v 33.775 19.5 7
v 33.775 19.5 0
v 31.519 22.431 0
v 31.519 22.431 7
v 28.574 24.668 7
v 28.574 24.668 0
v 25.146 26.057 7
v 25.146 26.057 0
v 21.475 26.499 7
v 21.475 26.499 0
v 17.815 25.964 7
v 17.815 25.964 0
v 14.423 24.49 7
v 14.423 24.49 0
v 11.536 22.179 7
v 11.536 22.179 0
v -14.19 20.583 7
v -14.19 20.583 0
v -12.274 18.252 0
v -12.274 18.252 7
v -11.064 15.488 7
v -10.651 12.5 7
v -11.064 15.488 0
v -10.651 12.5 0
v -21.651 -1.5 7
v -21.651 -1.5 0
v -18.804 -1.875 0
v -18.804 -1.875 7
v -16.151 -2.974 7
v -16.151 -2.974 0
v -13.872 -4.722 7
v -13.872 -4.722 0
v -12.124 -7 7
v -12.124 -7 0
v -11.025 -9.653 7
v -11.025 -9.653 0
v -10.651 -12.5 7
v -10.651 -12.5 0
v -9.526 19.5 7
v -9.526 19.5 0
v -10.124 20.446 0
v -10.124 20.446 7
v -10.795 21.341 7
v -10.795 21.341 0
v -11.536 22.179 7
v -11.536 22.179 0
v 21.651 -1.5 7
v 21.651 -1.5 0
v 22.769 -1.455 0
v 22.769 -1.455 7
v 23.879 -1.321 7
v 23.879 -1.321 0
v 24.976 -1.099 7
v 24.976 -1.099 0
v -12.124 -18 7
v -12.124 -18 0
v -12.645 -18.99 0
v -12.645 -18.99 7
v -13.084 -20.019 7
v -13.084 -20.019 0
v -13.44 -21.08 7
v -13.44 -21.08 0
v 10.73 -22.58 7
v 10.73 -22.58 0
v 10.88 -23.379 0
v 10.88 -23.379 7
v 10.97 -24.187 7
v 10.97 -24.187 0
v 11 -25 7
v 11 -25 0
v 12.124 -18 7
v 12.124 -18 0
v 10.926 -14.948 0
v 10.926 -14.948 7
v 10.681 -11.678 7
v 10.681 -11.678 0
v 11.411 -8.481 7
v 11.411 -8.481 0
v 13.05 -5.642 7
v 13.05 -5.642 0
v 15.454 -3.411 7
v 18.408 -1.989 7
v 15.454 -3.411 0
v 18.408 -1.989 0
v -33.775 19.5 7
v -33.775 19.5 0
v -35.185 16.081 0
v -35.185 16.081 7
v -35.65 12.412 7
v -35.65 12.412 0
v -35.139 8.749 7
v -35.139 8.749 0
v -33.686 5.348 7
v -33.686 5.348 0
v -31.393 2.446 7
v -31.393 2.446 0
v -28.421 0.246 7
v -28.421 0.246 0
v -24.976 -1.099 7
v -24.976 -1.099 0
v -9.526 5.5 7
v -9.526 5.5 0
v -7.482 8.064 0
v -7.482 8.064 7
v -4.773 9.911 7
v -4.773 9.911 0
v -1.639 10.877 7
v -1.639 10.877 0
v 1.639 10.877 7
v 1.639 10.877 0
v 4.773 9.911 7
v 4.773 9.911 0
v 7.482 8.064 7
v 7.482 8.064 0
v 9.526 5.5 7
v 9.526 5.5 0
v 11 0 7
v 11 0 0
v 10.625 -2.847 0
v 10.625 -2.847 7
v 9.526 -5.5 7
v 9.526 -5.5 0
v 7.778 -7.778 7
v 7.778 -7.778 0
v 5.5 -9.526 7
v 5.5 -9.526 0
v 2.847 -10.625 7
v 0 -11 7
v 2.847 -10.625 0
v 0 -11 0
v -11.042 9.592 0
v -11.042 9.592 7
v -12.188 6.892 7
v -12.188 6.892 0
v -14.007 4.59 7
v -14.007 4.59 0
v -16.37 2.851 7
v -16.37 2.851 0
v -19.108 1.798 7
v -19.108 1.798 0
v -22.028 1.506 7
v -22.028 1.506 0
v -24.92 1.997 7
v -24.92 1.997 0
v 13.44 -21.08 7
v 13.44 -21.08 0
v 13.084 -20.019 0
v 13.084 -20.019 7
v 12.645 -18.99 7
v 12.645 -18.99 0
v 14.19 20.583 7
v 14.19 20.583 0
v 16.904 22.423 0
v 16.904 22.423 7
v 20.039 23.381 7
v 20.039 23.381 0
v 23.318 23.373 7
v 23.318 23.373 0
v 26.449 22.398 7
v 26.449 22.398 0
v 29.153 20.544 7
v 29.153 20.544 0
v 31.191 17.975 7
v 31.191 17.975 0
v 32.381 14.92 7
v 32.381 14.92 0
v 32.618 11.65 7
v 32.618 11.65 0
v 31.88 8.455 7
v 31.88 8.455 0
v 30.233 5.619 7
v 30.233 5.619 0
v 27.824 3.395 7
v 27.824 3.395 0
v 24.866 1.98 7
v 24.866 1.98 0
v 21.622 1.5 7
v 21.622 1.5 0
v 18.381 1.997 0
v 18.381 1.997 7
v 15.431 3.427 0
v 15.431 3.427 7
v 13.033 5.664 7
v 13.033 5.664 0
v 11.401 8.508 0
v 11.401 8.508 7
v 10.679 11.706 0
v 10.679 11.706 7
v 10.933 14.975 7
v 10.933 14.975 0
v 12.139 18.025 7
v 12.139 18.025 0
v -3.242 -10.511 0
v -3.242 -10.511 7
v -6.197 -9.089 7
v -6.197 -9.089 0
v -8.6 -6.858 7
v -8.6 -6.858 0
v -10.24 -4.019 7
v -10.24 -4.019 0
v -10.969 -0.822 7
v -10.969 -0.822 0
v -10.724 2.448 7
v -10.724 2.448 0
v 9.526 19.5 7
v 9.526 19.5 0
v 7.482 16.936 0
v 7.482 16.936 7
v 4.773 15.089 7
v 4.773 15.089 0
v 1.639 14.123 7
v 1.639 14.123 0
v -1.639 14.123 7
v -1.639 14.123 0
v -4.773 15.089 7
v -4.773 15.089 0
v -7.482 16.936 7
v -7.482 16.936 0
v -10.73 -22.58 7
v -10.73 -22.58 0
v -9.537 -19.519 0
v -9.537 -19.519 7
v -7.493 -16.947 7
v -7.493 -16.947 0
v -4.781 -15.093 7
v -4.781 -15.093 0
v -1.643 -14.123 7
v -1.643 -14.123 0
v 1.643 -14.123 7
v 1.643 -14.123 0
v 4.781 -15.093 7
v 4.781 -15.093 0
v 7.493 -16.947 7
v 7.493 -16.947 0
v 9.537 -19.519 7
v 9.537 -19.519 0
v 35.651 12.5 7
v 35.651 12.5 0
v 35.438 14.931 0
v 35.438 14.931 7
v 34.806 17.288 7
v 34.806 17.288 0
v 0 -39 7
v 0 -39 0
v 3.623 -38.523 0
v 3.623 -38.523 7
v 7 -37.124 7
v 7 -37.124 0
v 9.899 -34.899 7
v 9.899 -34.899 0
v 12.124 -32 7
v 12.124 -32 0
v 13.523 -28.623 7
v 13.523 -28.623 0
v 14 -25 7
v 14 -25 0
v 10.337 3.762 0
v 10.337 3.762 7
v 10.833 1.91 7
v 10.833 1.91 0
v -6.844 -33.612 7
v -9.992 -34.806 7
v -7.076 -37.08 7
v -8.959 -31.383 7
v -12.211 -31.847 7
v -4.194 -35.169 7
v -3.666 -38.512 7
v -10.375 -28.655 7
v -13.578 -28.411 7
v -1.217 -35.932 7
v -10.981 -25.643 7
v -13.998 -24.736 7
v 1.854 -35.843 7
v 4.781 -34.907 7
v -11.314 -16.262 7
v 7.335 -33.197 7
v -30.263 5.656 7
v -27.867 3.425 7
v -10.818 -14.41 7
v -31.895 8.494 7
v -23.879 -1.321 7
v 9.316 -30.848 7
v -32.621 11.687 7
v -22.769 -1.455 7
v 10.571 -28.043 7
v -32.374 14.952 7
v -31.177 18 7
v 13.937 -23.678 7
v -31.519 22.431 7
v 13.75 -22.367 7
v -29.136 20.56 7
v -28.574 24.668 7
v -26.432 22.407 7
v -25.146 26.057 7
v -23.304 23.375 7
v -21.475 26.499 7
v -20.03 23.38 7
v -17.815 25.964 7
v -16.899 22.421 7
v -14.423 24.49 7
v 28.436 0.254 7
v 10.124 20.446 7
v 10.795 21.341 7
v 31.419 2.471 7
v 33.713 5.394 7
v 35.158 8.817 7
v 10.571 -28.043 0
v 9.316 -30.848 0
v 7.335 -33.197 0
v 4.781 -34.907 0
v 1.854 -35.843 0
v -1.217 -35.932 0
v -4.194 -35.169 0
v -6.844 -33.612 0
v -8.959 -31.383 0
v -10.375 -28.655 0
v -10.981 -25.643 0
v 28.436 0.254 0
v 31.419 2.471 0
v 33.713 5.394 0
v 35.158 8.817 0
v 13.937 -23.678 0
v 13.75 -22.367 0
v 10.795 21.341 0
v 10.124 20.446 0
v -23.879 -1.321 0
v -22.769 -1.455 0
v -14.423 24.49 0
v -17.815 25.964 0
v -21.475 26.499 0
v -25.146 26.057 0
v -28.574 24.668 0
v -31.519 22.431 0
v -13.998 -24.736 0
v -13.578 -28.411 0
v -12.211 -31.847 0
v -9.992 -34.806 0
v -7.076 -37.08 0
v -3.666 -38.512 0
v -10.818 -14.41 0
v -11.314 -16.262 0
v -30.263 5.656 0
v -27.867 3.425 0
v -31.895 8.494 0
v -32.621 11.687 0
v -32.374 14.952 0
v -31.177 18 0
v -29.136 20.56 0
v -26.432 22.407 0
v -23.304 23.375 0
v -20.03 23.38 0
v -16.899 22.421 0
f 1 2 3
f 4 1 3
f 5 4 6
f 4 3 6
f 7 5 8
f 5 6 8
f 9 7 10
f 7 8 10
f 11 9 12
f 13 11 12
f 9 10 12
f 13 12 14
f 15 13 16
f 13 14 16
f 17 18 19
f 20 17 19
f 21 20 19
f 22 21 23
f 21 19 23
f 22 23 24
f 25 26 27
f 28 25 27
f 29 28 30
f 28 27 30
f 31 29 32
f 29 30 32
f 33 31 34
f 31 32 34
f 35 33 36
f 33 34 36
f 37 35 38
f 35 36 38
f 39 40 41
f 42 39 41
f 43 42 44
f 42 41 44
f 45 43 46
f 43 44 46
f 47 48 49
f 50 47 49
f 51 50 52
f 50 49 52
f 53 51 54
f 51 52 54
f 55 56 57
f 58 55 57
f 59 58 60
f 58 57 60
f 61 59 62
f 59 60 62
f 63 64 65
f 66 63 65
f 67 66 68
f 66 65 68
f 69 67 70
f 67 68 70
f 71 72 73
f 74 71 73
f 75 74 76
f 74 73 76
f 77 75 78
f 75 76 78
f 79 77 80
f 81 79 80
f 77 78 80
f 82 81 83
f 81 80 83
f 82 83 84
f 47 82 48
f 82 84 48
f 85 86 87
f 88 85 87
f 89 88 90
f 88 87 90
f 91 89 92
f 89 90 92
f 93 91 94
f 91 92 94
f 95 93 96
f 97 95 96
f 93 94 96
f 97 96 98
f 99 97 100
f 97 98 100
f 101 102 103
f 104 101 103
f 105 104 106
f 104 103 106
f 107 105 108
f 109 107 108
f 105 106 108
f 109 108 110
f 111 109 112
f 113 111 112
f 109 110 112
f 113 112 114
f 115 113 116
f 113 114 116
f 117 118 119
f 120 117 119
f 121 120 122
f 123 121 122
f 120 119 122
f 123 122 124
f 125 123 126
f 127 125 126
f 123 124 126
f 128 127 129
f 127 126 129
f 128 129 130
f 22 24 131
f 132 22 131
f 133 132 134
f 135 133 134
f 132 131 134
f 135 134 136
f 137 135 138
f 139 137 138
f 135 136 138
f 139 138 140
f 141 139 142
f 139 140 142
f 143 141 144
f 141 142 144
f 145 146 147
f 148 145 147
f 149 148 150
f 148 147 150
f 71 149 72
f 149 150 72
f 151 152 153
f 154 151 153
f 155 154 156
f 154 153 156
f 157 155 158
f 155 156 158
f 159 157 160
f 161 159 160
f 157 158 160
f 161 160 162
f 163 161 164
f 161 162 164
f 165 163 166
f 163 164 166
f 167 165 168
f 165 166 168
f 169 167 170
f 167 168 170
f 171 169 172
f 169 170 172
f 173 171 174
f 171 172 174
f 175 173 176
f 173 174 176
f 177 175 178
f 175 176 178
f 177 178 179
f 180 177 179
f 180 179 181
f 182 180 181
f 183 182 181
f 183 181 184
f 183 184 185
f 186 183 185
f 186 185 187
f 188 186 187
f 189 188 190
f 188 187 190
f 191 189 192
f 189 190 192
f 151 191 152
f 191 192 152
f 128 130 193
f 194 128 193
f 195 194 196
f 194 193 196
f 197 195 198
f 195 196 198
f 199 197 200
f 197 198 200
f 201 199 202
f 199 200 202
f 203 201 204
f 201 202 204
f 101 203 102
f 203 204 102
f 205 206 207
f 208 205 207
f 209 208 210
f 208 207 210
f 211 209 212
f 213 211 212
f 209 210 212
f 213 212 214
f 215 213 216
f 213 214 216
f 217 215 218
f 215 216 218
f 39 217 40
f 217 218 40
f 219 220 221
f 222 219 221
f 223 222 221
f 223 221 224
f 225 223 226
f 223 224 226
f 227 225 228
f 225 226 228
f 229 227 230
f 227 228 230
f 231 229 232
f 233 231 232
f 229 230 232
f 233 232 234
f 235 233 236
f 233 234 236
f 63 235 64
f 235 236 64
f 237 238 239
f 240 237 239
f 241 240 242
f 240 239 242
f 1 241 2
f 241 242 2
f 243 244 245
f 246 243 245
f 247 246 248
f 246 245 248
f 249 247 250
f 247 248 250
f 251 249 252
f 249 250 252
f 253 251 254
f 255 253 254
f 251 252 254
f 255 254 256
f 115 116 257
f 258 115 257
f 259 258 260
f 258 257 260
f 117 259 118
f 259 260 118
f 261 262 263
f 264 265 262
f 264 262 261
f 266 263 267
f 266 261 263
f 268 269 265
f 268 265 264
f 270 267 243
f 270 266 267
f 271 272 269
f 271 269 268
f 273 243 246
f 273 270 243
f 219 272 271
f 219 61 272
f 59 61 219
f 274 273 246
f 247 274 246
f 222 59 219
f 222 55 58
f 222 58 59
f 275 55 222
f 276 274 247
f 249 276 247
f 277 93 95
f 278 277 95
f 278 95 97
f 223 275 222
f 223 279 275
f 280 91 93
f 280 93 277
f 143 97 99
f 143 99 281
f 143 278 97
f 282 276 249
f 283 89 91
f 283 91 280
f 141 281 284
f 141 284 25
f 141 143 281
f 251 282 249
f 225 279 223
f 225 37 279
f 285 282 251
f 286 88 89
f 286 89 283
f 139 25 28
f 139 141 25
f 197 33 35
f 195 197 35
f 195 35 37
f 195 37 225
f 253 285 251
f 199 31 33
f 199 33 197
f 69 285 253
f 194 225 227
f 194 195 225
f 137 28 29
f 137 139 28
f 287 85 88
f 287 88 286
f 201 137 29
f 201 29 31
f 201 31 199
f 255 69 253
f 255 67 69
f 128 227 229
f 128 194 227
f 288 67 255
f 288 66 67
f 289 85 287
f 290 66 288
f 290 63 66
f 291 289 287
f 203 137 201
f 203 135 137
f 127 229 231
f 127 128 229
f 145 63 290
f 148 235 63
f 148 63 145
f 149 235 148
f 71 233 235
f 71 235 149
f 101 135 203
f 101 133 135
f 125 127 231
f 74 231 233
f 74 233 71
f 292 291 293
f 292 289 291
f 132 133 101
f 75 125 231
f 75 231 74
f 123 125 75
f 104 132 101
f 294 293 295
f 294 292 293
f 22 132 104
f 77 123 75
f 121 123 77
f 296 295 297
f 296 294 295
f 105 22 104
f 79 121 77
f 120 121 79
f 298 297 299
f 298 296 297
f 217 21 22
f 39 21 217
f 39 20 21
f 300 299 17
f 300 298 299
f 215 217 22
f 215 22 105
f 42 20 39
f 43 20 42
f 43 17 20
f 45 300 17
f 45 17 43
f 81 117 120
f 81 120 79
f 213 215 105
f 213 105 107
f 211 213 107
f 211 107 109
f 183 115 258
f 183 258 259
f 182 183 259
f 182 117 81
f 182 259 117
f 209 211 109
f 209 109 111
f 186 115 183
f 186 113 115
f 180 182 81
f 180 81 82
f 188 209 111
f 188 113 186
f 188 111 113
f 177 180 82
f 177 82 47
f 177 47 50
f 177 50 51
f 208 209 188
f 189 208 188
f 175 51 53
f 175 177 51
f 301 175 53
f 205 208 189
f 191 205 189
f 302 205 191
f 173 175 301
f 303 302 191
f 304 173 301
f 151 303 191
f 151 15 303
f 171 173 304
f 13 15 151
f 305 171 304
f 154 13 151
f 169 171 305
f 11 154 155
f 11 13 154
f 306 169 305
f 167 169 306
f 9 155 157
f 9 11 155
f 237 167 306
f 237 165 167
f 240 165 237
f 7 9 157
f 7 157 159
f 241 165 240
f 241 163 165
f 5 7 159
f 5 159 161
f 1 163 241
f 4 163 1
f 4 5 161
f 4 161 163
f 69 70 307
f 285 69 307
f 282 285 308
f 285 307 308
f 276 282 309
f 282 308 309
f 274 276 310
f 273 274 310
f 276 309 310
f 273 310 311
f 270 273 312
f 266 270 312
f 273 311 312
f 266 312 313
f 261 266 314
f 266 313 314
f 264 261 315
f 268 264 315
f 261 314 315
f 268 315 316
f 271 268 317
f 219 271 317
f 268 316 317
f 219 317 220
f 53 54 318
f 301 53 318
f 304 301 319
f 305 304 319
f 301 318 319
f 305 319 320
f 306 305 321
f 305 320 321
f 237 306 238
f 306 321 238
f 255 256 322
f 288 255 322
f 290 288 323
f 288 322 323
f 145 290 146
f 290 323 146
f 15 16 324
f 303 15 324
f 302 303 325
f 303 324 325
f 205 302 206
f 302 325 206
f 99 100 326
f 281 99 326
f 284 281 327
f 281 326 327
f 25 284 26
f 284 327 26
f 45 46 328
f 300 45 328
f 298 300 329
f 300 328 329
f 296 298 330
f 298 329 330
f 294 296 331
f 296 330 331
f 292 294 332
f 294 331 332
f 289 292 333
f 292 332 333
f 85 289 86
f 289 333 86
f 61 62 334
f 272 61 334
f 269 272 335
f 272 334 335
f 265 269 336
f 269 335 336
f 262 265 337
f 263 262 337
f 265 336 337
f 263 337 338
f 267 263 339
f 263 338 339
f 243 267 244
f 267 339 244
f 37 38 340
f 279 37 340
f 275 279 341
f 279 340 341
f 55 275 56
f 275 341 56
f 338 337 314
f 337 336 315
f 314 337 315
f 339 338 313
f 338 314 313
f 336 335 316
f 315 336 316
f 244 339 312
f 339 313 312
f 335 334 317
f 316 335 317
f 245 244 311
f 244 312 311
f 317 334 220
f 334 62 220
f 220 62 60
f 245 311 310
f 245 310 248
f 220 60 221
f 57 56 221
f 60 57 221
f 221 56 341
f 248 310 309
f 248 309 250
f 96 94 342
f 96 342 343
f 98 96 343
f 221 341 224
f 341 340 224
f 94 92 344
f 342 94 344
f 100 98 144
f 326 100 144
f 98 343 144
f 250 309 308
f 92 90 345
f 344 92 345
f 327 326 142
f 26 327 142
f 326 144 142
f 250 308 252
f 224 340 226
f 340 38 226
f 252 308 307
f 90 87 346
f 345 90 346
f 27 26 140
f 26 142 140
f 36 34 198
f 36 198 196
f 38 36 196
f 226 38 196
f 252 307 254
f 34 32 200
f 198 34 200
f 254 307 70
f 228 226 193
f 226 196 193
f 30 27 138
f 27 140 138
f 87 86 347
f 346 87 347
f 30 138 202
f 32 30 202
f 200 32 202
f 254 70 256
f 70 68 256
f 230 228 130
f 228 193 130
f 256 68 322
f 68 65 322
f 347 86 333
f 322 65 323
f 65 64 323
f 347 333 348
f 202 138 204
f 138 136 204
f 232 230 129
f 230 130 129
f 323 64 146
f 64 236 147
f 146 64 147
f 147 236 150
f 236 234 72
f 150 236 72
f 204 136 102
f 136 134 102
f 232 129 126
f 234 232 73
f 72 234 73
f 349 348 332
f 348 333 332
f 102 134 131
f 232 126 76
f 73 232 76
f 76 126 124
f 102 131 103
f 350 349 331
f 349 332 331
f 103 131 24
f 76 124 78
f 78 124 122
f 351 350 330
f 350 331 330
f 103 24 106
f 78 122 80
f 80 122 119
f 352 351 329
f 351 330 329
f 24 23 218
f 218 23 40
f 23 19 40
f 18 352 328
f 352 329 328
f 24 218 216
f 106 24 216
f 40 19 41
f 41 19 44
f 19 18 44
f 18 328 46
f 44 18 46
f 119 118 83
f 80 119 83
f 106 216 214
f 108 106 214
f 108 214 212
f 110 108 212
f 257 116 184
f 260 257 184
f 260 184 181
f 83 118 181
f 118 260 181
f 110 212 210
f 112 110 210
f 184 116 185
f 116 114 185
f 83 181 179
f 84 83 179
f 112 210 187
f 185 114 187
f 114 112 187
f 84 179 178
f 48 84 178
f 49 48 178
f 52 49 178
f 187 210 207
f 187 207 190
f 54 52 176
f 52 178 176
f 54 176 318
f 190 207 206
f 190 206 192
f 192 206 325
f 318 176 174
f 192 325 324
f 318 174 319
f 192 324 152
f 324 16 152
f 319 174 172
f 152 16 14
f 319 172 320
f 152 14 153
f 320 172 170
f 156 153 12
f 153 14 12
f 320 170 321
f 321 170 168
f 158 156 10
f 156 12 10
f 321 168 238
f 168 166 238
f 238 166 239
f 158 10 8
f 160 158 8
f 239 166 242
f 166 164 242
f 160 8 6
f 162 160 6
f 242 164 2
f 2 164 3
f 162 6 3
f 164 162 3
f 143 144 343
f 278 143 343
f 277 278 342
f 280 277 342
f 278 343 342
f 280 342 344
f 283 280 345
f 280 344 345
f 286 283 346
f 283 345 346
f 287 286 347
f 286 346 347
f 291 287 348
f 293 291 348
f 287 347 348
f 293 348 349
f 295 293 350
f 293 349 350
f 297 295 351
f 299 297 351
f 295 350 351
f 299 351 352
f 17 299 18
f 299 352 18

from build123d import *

# Parameters (mm, degrees)
F1_DEPTH = 7


# Not quite as in the source:
# - a feature names something its author has since deleted; it is built from what else it names


with BuildPart() as f1:
    # F0 (on Top) → F1 (new body)
    with BuildSketch(Plane.XY):
        with BuildLine():
            ThreePointArc((9.5262796516, 5.4999996362), (10.6251841435, 2.8470092933), (11, 0))
            ThreePointArc((11, 0), (7.7781745931, -7.7781745931), (0, -11))
            ThreePointArc((0, -11), (6.9999999972, -12.8756443454), (12.1243556497, -17.9999999943))
            ThreePointArc((12.1243556497, -17.9999999943), (12.1243556546, -6.9999999972), (21.6506350946, -1.5))
            ThreePointArc((21.6506350946, -1.5), (14.6506352765, 0.375644242), (9.5262796516, 5.4999996362))
        make_face()
        with BuildLine():
            ThreePointArc((-9.5262796375, 5.4999996607), (1.41e-08, 11), (9.5262796516, 5.4999996362))
            ThreePointArc((9.5262796516, 5.4999996362), (7.6506350946, 12.4999999615), (9.5262796131, 19.500000297))
            ThreePointArc((9.5262796131, 19.500000297), (-4.54e-08, 14), (-9.5262796585, 19.5000003756))
            ThreePointArc((-9.5262796585, 19.5000003756), (-8.1276735827, 16.1234668409), (-7.6506350946, 12.5))
            ThreePointArc((-7.6506350946, 12.5), (-8.1276735773, 8.8765331793), (-9.5262796375, 5.4999996607))
        make_face()
        with BuildLine():
            ThreePointArc((9.5262796131, 19.500000297), (7.6506350946, 12.4999999615), (9.5262796516, 5.4999996362))
            ThreePointArc((9.5262796516, 5.4999996362), (14.6506352765, 0.375644242), (21.6506350946, -1.5))
            ThreePointArc((21.6506350946, -1.5), (23.3252484864, -1.3994845224), (24.9758155118, -1.0993814269))
            ThreePointArc((24.9758155118, -1.0993814269), (24.9939531467, -0.5498237016), (25, 0))
            ThreePointArc((25, 0), (24.9800177424, 0.9993565887), (24.9201029127, 1.9971156254))
            ThreePointArc((24.9201029127, 1.9971156254), (12.124355653, 7), (14.1896043222, 20.5828843746))
            ThreePointArc((14.1896043222, 20.5828843746), (12.8874554167, 21.4222662872), (11.5358155118, 22.1793814269))
            ThreePointArc((11.5358155118, 22.1793814269), (10.4506351975, 20.9000001372), (9.5262796131, 19.500000297))
        make_face()
        with BuildLine():
            ThreePointArc((-12.1243556177, -17.999999939), (-6.9999999695, -12.8756443294), (0, -11))
            ThreePointArc((0, -11), (-9.5262793437, -5.5000001697), (-9.5262796375, 5.4999996607))
            ThreePointArc((-9.5262796375, 5.4999996607), (-14.6506352643, 0.3756442491), (-21.6506350946, -1.5))
            ThreePointArc((-21.6506350946, -1.5), (-13.8724605016, -4.7218254069), (-10.6506350946, -12.5))
            ThreePointArc((-10.6506350946, -12.5), (-11.0254509963, -15.3470094621), (-12.1243556177, -17.999999939))
        make_face()
        with BuildLine():
            ThreePointArc((12.1243556497, -17.9999999943), (6.9999999972, -12.8756443454), (0, -11))
            ThreePointArc((0, -11), (-6.9999999695, -12.8756443294), (-12.1243556177, -17.999999939))
            ThreePointArc((-12.1243556177, -17.999999939), (-12.8746133779, -19.5005154452), (-13.44, -21.08))
            ThreePointArc((-13.44, -21.08), (-12.108499103, -21.8719969247), (-10.7304985905, -22.58))
            ThreePointArc((-10.7304985905, -22.58), (0, -14), (10.7304985905, -22.58))
            ThreePointArc((10.7304985905, -22.58), (12.108499103, -21.8719969247), (13.44, -21.08))
            ThreePointArc((13.44, -21.08), (12.8746133905, -19.5005154746), (12.1243556497, -17.9999999943))
        make_face()
        with BuildLine():
            ThreePointArc((-21.6506350946, -1.5), (-14.6506352643, 0.3756442491), (-9.5262796375, 5.4999996607))
            ThreePointArc((-9.5262796375, 5.4999996607), (-8.1276735773, 8.8765331793), (-7.6506350946, 12.5))
            ThreePointArc((-7.6506350946, 12.5), (-8.1276735827, 16.1234668409), (-9.5262796585, 19.5000003756))
            ThreePointArc((-9.5262796585, 19.5000003756), (-10.4506352247, 20.9000001735), (-11.5358155118, 22.1793814269))
            ThreePointArc((-11.5358155118, 22.1793814269), (-12.8874554167, 21.4222662872), (-14.1896043222, 20.5828843746))
            ThreePointArc((-14.1896043222, 20.5828843746), (-11.5741441752, 16.9118398375), (-10.6506350946, 12.5))
            ThreePointArc((-10.6506350946, 12.5), (-15.1300578962, 3.6409891636), (-24.9201029127, 1.9971156254))
            ThreePointArc((-24.9201029127, 1.9971156254), (-24.9959545198, 0.4497306374), (-24.9758155118, -1.0993814269))
            ThreePointArc((-24.9758155118, -1.0993814269), (-23.3252484864, -1.3994845224), (-21.6506350946, -1.5))
        make_face()
        with BuildLine():
            ThreePointArc((33.7749911327, 19.499999333), (23.3252488687, 26.3994844763), (11.5358155118, 22.1793814269))
            ThreePointArc((11.5358155118, 22.1793814269), (12.8874554167, 21.4222662872), (14.1896043222, 20.5828843746))
            ThreePointArc((14.1896043222, 20.5828843746), (26.0624749321, 22.5764909194), (32.6506350946, 12.5))
            ThreePointArc((32.6506350946, 12.5), (30.509645931, 5.9794228016), (24.9201029127, 1.9971156254))
            ThreePointArc((24.9201029127, 1.9971156254), (24.9800177424, 0.9993565887), (25, 0))
            ThreePointArc((25, 0), (24.9939531467, -0.5498237016), (24.9758155118, -1.0993814269))
            ThreePointArc((24.9758155118, -1.0993814269), (32.6631853406, 3.8557107244), (35.6506350946, 12.5))
            ThreePointArc((35.6506350946, 12.5), (35.1735967623, 16.1234662595), (33.7749911327, 19.499999333))
        make_face()
        with BuildLine():
            ThreePointArc((14, -25), (13.8592929113, -23.0201010127), (13.44, -21.08))
            ThreePointArc((13.44, -21.08), (12.108499103, -21.8719969247), (10.7304985905, -22.58))
            ThreePointArc((10.7304985905, -22.58), (10.9324170359, -23.782519917), (11, -25))
            ThreePointArc((11, -25), (-1.217480083, -35.9324170359), (-10.7304985905, -22.58))
            ThreePointArc((-10.7304985905, -22.58), (-12.108499103, -21.8719969247), (-13.44, -21.08))
            ThreePointArc((-13.44, -21.08), (-11.2000000155, -33.3999999793), (-5.18e-08, -39))
            ThreePointArc((-5.18e-08, -39), (9.8994949183, -34.8994949549), (14, -25))
        make_face()
        with BuildLine():
            ThreePointArc((-33.7749911175, 19.4999993593), (-34.5252483411, 7.0005151375), (-24.9758155118, -1.0993814269))
            ThreePointArc((-24.9758155118, -1.0993814269), (-24.9959545198, 0.4497306374), (-24.9201029127, 1.9971156254))
            ThreePointArc((-24.9201029127, 1.9971156254), (-31.1769145362, 18), (-14.1896043222, 20.5828843746))
            ThreePointArc((-14.1896043222, 20.5828843746), (-12.8874554167, 21.4222662872), (-11.5358155118, 22.1793814269))
            ThreePointArc((-11.5358155118, 22.1793814269), (-23.3252488536, 26.3994844781), (-33.7749911175, 19.4999993593))
        make_face()
    extrude(amount=F1_DEPTH)


solid = f1.part
